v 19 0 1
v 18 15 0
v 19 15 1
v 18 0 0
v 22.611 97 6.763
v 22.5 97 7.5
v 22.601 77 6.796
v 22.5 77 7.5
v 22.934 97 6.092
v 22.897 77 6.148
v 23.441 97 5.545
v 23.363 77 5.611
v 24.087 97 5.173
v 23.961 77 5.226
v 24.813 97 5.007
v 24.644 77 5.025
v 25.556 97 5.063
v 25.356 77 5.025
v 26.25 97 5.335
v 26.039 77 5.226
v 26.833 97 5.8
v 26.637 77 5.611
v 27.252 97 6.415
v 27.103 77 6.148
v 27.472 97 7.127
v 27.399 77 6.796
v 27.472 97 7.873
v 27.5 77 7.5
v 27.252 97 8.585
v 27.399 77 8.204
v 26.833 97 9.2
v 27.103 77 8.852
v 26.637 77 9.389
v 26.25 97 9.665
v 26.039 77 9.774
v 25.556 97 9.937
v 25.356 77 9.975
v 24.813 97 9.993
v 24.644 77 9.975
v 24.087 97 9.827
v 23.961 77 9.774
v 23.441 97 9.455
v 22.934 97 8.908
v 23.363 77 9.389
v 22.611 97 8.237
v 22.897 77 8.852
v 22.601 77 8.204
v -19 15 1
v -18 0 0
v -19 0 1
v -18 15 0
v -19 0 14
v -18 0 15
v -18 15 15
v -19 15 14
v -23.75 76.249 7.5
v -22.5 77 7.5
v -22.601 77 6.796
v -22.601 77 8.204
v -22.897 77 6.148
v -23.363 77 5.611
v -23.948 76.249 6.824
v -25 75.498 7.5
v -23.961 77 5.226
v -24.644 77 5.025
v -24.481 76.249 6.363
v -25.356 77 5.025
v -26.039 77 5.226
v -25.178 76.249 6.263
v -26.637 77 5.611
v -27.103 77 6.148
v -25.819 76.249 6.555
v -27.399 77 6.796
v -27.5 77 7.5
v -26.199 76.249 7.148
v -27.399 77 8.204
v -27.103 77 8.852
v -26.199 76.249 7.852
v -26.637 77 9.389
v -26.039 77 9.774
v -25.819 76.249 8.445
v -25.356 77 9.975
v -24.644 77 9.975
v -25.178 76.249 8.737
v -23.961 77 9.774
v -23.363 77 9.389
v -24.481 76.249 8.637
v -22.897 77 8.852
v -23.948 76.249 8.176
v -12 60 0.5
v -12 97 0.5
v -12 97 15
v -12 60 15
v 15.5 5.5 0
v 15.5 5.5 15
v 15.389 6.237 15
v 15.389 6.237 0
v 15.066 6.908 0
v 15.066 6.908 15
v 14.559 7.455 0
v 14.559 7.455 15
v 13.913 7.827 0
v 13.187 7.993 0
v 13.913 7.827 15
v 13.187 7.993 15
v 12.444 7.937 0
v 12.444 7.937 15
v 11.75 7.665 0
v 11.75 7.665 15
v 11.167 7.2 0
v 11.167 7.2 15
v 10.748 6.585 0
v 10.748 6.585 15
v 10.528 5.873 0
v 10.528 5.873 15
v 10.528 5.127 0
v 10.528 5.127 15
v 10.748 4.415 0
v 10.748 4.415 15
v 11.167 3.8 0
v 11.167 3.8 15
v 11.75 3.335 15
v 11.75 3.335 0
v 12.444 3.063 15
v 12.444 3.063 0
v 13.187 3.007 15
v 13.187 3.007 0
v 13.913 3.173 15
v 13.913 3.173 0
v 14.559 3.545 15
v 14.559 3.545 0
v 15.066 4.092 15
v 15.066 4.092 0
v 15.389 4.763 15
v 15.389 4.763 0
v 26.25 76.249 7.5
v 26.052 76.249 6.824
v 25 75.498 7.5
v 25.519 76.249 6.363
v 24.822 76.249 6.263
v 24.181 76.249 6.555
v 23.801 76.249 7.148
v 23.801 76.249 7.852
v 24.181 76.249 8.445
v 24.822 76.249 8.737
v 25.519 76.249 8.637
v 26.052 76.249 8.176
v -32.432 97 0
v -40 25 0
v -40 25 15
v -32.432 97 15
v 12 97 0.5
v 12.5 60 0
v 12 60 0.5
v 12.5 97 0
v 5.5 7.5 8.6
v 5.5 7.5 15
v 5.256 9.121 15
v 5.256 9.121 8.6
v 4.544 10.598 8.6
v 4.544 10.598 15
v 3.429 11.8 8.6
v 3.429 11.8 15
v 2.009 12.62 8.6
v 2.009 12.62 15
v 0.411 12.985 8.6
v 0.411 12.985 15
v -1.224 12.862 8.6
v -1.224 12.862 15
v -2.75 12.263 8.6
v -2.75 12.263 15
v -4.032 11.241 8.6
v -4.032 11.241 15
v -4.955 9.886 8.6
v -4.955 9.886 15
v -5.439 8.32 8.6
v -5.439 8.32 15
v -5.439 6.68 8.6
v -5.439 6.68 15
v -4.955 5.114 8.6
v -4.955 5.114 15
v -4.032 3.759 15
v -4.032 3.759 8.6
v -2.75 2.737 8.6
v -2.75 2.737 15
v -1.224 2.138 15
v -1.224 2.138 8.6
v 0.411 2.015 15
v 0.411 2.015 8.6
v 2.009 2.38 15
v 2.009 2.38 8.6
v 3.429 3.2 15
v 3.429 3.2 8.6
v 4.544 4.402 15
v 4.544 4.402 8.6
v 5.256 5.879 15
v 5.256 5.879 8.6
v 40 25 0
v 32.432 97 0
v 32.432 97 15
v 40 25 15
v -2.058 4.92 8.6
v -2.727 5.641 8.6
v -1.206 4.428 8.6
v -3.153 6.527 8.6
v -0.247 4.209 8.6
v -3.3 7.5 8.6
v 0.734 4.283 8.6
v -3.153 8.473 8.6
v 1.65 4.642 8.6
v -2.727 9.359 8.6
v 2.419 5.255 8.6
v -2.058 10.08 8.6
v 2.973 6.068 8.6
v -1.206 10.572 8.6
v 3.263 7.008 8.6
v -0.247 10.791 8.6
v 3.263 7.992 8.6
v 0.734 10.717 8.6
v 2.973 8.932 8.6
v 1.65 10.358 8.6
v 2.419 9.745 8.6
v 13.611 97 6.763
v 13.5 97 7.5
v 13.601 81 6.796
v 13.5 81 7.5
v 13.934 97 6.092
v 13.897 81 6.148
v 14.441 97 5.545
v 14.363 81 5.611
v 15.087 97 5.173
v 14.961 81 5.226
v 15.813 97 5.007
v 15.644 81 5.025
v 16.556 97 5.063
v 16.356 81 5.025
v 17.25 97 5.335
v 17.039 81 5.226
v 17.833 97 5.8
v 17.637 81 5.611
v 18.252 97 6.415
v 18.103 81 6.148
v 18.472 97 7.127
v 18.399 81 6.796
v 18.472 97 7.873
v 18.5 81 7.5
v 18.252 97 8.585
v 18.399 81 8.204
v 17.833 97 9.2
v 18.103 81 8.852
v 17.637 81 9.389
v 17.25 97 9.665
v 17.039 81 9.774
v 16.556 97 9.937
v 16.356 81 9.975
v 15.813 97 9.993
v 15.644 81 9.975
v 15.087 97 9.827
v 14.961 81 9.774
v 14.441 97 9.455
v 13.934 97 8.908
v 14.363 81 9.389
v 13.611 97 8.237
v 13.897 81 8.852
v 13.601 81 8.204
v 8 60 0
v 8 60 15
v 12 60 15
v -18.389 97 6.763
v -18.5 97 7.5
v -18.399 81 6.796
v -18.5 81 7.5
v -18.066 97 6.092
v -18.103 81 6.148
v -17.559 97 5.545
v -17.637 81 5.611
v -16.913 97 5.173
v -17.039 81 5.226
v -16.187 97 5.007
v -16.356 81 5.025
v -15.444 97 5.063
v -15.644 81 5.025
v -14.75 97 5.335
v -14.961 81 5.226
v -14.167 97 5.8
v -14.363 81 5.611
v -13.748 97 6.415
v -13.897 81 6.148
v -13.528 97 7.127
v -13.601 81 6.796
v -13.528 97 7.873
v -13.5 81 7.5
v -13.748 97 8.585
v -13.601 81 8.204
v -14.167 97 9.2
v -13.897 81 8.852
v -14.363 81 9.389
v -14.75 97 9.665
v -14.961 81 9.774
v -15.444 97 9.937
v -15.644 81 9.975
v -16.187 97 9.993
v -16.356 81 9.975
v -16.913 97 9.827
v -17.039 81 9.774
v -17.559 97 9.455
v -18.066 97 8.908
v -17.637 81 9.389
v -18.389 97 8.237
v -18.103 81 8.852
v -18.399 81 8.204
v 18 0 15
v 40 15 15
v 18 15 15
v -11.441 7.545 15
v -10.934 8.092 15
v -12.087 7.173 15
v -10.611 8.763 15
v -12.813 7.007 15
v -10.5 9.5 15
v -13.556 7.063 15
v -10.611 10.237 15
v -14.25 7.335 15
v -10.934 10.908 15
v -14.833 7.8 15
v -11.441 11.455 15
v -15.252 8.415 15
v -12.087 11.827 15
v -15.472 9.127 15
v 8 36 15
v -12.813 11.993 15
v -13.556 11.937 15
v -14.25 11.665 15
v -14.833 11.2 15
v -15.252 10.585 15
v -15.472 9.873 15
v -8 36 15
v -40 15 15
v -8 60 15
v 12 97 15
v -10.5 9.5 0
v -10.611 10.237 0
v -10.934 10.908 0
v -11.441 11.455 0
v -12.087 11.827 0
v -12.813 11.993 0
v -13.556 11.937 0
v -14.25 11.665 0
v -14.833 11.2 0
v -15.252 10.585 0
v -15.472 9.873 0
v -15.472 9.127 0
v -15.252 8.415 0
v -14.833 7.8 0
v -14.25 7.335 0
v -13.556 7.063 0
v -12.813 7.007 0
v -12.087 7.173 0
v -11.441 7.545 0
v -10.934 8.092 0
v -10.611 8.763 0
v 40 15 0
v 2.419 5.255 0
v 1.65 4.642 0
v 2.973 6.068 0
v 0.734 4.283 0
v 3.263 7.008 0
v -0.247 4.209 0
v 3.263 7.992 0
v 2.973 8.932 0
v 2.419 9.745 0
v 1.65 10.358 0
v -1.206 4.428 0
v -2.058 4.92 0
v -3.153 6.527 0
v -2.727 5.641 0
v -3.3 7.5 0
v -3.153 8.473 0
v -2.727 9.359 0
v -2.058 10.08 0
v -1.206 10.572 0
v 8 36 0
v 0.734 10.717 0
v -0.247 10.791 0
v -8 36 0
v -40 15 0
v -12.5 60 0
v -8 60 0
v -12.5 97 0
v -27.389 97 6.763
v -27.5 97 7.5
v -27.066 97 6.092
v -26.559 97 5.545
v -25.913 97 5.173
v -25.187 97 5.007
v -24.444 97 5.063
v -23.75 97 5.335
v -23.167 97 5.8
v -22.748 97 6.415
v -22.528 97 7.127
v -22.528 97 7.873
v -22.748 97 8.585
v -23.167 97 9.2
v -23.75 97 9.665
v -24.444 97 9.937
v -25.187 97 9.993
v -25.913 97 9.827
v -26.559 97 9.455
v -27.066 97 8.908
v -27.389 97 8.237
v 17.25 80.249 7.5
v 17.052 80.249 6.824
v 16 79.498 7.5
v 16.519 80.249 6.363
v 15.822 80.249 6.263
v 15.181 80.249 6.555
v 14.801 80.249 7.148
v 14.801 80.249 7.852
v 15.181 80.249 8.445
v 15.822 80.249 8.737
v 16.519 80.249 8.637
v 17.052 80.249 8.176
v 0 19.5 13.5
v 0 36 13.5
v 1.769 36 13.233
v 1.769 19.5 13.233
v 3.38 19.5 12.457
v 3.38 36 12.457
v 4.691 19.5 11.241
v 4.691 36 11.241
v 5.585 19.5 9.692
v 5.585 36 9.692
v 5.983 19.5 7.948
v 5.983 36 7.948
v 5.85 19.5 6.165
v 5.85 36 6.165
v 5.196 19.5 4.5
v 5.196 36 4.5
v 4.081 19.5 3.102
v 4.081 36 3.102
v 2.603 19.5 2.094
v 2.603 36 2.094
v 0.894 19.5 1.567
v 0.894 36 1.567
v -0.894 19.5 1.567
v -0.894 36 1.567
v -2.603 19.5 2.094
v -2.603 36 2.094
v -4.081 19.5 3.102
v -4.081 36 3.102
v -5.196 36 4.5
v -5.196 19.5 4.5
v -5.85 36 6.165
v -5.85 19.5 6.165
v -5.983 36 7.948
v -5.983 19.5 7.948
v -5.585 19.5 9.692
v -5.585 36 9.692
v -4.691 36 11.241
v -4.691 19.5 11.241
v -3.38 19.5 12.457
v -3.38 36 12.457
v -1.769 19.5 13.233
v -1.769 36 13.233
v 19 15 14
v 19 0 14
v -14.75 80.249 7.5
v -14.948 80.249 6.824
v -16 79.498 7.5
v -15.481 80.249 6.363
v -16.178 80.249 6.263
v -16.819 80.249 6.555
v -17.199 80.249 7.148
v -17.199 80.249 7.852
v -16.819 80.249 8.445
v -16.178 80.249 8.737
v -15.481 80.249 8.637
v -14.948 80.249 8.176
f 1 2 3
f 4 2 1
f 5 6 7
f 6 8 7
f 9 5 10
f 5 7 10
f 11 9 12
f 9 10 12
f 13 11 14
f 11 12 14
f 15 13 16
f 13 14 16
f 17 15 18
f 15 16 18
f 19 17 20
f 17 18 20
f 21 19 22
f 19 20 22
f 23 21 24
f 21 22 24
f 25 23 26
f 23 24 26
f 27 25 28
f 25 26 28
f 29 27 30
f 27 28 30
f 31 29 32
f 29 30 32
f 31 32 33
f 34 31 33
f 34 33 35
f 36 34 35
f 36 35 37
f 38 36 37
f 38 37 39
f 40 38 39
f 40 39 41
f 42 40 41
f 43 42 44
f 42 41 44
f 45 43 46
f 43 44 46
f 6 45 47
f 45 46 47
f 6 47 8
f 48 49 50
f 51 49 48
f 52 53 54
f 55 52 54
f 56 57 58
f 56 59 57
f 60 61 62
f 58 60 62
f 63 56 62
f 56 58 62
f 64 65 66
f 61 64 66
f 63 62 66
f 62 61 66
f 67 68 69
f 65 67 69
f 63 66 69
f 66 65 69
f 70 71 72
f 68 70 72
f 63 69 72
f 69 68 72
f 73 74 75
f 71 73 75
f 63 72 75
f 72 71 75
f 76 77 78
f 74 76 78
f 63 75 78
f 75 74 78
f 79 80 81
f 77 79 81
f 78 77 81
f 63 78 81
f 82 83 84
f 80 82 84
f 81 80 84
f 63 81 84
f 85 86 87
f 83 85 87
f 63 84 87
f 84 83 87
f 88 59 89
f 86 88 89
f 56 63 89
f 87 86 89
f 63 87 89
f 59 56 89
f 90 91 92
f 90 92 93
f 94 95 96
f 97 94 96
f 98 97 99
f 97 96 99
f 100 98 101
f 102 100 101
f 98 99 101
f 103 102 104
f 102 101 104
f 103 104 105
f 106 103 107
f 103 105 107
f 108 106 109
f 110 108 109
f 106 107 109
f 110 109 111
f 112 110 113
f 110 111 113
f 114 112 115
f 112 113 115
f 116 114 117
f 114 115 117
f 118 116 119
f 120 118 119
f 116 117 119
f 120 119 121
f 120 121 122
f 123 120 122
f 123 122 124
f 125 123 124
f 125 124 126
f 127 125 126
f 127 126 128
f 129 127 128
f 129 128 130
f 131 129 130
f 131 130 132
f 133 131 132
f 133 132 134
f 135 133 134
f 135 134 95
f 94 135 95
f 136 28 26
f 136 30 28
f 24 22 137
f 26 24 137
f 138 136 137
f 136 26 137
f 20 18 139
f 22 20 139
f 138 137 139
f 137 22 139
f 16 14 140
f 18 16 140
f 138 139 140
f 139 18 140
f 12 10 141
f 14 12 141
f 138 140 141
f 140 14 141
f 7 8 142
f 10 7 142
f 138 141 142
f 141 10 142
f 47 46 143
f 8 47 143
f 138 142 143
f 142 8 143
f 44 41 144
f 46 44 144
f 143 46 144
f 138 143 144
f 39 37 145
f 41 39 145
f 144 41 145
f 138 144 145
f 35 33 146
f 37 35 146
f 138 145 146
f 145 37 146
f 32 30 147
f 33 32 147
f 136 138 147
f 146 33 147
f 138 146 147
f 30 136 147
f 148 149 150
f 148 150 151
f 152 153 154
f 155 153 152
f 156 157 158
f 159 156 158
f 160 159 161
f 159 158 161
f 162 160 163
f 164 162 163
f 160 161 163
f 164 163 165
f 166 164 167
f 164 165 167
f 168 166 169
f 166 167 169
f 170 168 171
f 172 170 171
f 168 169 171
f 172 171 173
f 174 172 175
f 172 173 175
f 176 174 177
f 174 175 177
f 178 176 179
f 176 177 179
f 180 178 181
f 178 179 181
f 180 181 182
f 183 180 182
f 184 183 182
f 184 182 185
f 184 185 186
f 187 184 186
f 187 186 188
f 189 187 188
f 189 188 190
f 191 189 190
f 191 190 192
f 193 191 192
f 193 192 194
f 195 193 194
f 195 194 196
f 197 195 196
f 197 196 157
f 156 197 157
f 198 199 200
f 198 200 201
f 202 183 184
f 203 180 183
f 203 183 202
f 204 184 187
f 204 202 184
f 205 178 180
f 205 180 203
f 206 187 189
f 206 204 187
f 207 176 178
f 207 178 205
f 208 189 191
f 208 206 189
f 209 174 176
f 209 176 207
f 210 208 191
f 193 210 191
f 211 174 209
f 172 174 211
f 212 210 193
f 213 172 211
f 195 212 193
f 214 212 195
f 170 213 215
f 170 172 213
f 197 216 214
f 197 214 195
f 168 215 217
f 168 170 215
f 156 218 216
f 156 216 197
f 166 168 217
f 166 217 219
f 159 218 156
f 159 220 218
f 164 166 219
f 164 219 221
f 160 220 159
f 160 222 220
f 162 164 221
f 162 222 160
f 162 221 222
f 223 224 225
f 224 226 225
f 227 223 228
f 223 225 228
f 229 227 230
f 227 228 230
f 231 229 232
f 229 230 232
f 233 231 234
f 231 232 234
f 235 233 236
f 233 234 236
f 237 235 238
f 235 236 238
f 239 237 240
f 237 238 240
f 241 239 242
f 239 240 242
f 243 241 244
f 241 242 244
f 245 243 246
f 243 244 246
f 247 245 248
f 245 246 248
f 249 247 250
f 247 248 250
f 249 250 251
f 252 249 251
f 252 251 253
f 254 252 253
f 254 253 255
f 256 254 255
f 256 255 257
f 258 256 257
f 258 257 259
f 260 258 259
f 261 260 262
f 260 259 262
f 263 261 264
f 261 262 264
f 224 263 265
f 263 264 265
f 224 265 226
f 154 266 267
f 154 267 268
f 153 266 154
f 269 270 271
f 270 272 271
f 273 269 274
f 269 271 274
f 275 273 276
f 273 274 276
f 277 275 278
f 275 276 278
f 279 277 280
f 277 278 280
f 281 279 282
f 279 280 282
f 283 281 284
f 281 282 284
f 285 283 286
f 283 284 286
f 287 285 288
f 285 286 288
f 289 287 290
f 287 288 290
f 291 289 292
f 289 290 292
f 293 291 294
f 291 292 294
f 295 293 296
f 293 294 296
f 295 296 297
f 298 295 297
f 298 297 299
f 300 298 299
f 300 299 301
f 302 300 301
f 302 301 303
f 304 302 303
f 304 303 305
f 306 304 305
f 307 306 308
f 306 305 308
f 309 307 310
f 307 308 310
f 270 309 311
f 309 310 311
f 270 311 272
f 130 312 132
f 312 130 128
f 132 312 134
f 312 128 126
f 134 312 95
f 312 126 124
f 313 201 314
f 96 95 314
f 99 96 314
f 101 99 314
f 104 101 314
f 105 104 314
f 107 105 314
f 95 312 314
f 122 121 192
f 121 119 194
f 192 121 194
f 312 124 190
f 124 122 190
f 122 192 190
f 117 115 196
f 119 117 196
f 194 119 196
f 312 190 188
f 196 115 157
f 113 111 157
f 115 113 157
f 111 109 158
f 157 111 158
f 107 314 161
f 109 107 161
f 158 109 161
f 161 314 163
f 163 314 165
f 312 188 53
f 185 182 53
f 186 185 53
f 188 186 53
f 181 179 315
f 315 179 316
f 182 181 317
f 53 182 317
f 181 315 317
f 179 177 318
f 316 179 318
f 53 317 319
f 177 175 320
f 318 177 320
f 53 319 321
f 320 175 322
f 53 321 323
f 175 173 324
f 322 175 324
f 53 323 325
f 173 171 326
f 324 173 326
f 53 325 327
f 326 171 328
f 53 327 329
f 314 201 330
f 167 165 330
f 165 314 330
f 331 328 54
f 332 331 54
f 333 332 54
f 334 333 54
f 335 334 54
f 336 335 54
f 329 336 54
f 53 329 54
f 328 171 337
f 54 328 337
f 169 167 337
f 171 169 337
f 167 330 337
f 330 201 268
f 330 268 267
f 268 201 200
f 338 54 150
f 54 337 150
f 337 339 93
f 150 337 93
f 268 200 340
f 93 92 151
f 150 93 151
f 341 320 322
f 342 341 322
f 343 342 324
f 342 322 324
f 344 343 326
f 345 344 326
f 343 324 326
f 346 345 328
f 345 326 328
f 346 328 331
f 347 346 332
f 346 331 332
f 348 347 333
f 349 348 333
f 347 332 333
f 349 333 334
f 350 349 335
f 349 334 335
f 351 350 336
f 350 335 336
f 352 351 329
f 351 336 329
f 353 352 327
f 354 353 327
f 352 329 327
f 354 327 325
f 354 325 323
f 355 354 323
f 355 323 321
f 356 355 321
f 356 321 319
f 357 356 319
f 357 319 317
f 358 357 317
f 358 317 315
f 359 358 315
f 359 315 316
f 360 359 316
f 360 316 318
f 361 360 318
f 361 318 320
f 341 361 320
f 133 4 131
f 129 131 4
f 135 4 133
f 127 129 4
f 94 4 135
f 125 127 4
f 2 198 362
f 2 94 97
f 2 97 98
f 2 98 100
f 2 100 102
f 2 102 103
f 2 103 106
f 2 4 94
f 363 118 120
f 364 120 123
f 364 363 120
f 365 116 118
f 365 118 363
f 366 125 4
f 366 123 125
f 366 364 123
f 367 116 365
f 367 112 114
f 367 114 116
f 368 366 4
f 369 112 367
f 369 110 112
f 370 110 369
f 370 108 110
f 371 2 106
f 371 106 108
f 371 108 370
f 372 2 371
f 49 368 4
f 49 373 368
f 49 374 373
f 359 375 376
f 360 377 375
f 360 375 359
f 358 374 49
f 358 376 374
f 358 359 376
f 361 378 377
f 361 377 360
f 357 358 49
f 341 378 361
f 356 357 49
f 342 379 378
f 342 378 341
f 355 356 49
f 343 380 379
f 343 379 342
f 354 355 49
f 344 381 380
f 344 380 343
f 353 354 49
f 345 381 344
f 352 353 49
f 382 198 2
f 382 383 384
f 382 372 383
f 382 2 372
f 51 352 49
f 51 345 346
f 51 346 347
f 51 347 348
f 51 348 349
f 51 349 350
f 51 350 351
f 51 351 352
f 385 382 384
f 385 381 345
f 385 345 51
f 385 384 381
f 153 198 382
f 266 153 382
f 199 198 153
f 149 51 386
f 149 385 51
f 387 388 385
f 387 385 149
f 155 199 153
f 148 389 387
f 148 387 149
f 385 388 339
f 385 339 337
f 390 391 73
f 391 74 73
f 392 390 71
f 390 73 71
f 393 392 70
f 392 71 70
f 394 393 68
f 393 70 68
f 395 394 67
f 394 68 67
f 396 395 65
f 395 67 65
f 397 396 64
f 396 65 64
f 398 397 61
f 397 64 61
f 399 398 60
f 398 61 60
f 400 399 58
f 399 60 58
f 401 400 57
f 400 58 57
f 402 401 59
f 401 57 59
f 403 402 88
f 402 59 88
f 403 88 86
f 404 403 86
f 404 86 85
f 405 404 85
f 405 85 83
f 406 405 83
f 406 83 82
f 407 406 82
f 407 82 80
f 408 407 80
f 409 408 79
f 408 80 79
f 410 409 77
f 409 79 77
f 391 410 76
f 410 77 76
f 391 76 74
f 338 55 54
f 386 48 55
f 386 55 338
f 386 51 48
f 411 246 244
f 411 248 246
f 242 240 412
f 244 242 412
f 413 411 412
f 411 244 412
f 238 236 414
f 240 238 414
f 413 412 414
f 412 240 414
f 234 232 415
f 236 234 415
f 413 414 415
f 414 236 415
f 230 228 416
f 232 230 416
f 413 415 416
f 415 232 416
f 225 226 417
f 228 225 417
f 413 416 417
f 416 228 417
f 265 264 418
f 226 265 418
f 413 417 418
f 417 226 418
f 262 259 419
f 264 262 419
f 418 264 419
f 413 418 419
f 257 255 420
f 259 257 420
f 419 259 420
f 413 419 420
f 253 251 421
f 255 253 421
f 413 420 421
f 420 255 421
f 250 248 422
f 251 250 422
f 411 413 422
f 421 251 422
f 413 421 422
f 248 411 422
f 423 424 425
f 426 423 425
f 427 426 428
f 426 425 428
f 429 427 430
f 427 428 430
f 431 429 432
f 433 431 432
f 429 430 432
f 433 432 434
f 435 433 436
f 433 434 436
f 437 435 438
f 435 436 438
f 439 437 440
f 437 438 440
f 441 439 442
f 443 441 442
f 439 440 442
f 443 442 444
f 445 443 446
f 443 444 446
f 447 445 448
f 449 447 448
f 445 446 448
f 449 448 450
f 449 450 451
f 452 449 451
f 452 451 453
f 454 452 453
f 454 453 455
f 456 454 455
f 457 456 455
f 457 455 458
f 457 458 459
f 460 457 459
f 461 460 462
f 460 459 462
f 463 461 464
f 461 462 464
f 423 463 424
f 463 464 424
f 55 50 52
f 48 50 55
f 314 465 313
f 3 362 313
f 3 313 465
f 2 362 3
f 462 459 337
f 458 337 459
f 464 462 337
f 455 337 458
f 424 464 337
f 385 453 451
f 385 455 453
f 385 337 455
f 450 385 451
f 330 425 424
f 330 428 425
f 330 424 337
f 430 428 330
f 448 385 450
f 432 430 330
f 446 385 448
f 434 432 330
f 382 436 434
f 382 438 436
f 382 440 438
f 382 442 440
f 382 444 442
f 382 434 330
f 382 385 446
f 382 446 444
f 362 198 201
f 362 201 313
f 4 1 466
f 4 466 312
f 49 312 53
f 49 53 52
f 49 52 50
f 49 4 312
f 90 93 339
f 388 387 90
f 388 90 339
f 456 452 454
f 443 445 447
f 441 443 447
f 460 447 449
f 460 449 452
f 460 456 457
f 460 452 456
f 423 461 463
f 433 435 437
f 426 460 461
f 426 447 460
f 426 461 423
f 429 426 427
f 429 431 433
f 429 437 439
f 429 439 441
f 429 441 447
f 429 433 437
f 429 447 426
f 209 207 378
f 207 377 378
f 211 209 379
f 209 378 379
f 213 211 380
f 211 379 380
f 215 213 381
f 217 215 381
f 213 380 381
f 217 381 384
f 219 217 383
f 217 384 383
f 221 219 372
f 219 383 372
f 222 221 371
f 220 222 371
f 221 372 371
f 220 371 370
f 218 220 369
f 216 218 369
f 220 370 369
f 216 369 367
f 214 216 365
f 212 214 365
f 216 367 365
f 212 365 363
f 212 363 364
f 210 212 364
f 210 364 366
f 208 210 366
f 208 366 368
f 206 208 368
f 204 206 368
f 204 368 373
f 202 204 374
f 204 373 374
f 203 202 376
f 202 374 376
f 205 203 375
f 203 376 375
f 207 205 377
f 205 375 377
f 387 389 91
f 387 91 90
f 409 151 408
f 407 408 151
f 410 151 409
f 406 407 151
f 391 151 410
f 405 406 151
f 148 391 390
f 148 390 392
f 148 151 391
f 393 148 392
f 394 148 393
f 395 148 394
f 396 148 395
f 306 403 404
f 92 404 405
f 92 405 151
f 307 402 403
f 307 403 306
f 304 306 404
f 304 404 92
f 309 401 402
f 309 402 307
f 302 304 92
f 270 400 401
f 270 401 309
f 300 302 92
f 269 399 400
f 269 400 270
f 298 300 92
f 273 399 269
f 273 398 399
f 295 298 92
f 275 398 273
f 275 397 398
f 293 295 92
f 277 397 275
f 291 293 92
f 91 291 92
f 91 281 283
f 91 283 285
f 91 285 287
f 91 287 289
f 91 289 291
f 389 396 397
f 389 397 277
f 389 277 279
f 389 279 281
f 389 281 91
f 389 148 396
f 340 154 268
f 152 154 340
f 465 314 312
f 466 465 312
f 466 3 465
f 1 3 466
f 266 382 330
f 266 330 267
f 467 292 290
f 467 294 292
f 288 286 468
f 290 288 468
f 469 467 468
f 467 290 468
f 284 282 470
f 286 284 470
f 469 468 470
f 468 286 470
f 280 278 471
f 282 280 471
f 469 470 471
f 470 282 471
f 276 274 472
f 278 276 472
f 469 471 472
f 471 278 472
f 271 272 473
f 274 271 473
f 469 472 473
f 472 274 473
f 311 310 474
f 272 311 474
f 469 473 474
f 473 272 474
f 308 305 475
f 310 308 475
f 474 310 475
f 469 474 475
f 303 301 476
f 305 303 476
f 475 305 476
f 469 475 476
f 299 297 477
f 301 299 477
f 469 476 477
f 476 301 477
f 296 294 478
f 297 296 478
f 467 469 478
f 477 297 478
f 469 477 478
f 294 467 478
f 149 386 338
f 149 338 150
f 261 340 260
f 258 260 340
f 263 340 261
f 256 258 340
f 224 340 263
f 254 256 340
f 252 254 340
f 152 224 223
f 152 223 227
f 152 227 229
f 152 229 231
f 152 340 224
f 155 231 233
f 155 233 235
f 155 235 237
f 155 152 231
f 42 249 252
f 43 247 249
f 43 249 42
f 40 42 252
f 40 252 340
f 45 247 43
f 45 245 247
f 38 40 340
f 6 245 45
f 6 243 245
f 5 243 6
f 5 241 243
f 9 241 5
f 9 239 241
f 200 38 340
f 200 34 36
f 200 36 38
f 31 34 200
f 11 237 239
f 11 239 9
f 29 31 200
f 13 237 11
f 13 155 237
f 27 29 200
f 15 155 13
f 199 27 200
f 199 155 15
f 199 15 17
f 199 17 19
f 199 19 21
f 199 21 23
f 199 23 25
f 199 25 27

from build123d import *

# Parameters (mm, degrees)
ESTRUSIONE_ESTRUSIONE1_DEPTH                         = 15
FORO_5_0_5_1_D                                       = 5
FORO_5_0_5_1_DEPTH                                   = 16
FORO_5_0_5_1_TIP                                     = 1.502151548
FORO_FILETTATO_M6_1_D                                = 5
FORO_FILETTATO_M6_1_DEPTH                            = 20
FORO_FILETTATO_M6_1_TIP                              = 1.502151548
SCHIZZO7_R                                           = 6
TAGLIO_ESTRUSIONE1_DEPTH                             = 16.5
FORO_5_0_5_2_D                                       = 5
FORO_LAMATO_PER_VITE_M6_A_TESTA_CILINDRI_D           = 6.6
FORO_LAMATO_PER_VITE_M6_A_TESTA_CILINDRI_CBORE_D     = 11
FORO_LAMATO_PER_VITE_M6_A_TESTA_CILINDRI_CBORE_DEPTH = 6.4
SMUSSO1_SIZE                                         = 1
SMUSSO2_SIZE                                         = 0.5


with BuildPart() as part:
    # Schizzo1 → Estrusione-Estrusione1 (new body)
    with BuildSketch(Plane.XY):
        Polygon((19, 0), (-19, 0), (-19, 15), (-40, 15), (-40, 25), (-32.432495061, 97), (-12, 97), (-12, 60), (-8, 60), (-8, 36), (8, 36), (8, 60), (12, 60), (12, 97), (32.432495061, 97), (40, 25), (40, 15), (19, 15), align=None)
    extrude(amount=ESTRUSIONE_ESTRUSIONE1_DEPTH)

    # Foro Ø5.0 (5)-1
    with Locations(Plane(origin=(0, 97, 0), x_dir=(1, 0, 0), z_dir=(0, 1, 0))):
        with Locations((-16, -7.5), (16, -7.5)):
            Hole(FORO_5_0_5_1_D / 2, depth=FORO_5_0_5_1_DEPTH)
            with Locations((0, 0, -(FORO_5_0_5_1_DEPTH + FORO_5_0_5_1_TIP / 2))):  # 118° drill point
                Cone(0, FORO_5_0_5_1_D / 2, FORO_5_0_5_1_TIP, mode=Mode.SUBTRACT)

    # Foro filettato M6-1
    with Locations(Plane(origin=(0, 97, 0), x_dir=(1, 0, 0), z_dir=(0, 1, 0))):
        with Locations((-25, -7.5), (25, -7.5)):
            Hole(FORO_FILETTATO_M6_1_D / 2, depth=FORO_FILETTATO_M6_1_DEPTH)
            with Locations((0, 0, -(FORO_FILETTATO_M6_1_DEPTH + FORO_FILETTATO_M6_1_TIP / 2))):  # 118° drill point
                Cone(0, FORO_FILETTATO_M6_1_D / 2, FORO_FILETTATO_M6_1_TIP, mode=Mode.SUBTRACT)

    # Schizzo7 → Taglio-Estrusione1 (cut)
    with BuildSketch(Plane(origin=(0, 36, 0), x_dir=(1, 0, 0), z_dir=(0, 1, 0))):
        with Locations(Location((0, -7.5, 0), (0, 0, 270))):
            Circle(SCHIZZO7_R)
    extrude(amount=-TAGLIO_ESTRUSIONE1_DEPTH, mode=Mode.SUBTRACT)

    # Foro Ø5.0 (5)-2 (through all)
    with Locations(Plane(origin=(0, 0, 0), x_dir=(-1, 0, 0), z_dir=(0, 0, -1))):
        with Locations((-13, 5.5), (13, 9.5)):
            Hole(FORO_5_0_5_2_D / 2)

    # Foro lamato per Vite M6 a testa cilindrica-1 (through all)
    with Locations(Plane.XY.offset(15)):
        with Locations((0, 7.5)):
            CounterBoreHole(FORO_LAMATO_PER_VITE_M6_A_TESTA_CILINDRI_D / 2, FORO_LAMATO_PER_VITE_M6_A_TESTA_CILINDRI_CBORE_D / 2, FORO_LAMATO_PER_VITE_M6_A_TESTA_CILINDRI_CBORE_DEPTH)

    # Smusso1
    smusso1_edges = [part.edges().sort_by_distance(p)[0] for p in [
        (-19, 7.5, 15),
        (19, 7.5, 15),
        (19, 7.5, 0),
        (-19, 7.5, 0),
    ]]
    chamfer(smusso1_edges, length=SMUSSO1_SIZE)

    # Smusso2
    smusso2_edges = [part.edges().sort_by_distance(p)[0] for p in [
        (-12, 78.5, 0),
        (12, 78.5, 0),
    ]]
    chamfer(smusso2_edges, length=SMUSSO2_SIZE)


solid = part.part
